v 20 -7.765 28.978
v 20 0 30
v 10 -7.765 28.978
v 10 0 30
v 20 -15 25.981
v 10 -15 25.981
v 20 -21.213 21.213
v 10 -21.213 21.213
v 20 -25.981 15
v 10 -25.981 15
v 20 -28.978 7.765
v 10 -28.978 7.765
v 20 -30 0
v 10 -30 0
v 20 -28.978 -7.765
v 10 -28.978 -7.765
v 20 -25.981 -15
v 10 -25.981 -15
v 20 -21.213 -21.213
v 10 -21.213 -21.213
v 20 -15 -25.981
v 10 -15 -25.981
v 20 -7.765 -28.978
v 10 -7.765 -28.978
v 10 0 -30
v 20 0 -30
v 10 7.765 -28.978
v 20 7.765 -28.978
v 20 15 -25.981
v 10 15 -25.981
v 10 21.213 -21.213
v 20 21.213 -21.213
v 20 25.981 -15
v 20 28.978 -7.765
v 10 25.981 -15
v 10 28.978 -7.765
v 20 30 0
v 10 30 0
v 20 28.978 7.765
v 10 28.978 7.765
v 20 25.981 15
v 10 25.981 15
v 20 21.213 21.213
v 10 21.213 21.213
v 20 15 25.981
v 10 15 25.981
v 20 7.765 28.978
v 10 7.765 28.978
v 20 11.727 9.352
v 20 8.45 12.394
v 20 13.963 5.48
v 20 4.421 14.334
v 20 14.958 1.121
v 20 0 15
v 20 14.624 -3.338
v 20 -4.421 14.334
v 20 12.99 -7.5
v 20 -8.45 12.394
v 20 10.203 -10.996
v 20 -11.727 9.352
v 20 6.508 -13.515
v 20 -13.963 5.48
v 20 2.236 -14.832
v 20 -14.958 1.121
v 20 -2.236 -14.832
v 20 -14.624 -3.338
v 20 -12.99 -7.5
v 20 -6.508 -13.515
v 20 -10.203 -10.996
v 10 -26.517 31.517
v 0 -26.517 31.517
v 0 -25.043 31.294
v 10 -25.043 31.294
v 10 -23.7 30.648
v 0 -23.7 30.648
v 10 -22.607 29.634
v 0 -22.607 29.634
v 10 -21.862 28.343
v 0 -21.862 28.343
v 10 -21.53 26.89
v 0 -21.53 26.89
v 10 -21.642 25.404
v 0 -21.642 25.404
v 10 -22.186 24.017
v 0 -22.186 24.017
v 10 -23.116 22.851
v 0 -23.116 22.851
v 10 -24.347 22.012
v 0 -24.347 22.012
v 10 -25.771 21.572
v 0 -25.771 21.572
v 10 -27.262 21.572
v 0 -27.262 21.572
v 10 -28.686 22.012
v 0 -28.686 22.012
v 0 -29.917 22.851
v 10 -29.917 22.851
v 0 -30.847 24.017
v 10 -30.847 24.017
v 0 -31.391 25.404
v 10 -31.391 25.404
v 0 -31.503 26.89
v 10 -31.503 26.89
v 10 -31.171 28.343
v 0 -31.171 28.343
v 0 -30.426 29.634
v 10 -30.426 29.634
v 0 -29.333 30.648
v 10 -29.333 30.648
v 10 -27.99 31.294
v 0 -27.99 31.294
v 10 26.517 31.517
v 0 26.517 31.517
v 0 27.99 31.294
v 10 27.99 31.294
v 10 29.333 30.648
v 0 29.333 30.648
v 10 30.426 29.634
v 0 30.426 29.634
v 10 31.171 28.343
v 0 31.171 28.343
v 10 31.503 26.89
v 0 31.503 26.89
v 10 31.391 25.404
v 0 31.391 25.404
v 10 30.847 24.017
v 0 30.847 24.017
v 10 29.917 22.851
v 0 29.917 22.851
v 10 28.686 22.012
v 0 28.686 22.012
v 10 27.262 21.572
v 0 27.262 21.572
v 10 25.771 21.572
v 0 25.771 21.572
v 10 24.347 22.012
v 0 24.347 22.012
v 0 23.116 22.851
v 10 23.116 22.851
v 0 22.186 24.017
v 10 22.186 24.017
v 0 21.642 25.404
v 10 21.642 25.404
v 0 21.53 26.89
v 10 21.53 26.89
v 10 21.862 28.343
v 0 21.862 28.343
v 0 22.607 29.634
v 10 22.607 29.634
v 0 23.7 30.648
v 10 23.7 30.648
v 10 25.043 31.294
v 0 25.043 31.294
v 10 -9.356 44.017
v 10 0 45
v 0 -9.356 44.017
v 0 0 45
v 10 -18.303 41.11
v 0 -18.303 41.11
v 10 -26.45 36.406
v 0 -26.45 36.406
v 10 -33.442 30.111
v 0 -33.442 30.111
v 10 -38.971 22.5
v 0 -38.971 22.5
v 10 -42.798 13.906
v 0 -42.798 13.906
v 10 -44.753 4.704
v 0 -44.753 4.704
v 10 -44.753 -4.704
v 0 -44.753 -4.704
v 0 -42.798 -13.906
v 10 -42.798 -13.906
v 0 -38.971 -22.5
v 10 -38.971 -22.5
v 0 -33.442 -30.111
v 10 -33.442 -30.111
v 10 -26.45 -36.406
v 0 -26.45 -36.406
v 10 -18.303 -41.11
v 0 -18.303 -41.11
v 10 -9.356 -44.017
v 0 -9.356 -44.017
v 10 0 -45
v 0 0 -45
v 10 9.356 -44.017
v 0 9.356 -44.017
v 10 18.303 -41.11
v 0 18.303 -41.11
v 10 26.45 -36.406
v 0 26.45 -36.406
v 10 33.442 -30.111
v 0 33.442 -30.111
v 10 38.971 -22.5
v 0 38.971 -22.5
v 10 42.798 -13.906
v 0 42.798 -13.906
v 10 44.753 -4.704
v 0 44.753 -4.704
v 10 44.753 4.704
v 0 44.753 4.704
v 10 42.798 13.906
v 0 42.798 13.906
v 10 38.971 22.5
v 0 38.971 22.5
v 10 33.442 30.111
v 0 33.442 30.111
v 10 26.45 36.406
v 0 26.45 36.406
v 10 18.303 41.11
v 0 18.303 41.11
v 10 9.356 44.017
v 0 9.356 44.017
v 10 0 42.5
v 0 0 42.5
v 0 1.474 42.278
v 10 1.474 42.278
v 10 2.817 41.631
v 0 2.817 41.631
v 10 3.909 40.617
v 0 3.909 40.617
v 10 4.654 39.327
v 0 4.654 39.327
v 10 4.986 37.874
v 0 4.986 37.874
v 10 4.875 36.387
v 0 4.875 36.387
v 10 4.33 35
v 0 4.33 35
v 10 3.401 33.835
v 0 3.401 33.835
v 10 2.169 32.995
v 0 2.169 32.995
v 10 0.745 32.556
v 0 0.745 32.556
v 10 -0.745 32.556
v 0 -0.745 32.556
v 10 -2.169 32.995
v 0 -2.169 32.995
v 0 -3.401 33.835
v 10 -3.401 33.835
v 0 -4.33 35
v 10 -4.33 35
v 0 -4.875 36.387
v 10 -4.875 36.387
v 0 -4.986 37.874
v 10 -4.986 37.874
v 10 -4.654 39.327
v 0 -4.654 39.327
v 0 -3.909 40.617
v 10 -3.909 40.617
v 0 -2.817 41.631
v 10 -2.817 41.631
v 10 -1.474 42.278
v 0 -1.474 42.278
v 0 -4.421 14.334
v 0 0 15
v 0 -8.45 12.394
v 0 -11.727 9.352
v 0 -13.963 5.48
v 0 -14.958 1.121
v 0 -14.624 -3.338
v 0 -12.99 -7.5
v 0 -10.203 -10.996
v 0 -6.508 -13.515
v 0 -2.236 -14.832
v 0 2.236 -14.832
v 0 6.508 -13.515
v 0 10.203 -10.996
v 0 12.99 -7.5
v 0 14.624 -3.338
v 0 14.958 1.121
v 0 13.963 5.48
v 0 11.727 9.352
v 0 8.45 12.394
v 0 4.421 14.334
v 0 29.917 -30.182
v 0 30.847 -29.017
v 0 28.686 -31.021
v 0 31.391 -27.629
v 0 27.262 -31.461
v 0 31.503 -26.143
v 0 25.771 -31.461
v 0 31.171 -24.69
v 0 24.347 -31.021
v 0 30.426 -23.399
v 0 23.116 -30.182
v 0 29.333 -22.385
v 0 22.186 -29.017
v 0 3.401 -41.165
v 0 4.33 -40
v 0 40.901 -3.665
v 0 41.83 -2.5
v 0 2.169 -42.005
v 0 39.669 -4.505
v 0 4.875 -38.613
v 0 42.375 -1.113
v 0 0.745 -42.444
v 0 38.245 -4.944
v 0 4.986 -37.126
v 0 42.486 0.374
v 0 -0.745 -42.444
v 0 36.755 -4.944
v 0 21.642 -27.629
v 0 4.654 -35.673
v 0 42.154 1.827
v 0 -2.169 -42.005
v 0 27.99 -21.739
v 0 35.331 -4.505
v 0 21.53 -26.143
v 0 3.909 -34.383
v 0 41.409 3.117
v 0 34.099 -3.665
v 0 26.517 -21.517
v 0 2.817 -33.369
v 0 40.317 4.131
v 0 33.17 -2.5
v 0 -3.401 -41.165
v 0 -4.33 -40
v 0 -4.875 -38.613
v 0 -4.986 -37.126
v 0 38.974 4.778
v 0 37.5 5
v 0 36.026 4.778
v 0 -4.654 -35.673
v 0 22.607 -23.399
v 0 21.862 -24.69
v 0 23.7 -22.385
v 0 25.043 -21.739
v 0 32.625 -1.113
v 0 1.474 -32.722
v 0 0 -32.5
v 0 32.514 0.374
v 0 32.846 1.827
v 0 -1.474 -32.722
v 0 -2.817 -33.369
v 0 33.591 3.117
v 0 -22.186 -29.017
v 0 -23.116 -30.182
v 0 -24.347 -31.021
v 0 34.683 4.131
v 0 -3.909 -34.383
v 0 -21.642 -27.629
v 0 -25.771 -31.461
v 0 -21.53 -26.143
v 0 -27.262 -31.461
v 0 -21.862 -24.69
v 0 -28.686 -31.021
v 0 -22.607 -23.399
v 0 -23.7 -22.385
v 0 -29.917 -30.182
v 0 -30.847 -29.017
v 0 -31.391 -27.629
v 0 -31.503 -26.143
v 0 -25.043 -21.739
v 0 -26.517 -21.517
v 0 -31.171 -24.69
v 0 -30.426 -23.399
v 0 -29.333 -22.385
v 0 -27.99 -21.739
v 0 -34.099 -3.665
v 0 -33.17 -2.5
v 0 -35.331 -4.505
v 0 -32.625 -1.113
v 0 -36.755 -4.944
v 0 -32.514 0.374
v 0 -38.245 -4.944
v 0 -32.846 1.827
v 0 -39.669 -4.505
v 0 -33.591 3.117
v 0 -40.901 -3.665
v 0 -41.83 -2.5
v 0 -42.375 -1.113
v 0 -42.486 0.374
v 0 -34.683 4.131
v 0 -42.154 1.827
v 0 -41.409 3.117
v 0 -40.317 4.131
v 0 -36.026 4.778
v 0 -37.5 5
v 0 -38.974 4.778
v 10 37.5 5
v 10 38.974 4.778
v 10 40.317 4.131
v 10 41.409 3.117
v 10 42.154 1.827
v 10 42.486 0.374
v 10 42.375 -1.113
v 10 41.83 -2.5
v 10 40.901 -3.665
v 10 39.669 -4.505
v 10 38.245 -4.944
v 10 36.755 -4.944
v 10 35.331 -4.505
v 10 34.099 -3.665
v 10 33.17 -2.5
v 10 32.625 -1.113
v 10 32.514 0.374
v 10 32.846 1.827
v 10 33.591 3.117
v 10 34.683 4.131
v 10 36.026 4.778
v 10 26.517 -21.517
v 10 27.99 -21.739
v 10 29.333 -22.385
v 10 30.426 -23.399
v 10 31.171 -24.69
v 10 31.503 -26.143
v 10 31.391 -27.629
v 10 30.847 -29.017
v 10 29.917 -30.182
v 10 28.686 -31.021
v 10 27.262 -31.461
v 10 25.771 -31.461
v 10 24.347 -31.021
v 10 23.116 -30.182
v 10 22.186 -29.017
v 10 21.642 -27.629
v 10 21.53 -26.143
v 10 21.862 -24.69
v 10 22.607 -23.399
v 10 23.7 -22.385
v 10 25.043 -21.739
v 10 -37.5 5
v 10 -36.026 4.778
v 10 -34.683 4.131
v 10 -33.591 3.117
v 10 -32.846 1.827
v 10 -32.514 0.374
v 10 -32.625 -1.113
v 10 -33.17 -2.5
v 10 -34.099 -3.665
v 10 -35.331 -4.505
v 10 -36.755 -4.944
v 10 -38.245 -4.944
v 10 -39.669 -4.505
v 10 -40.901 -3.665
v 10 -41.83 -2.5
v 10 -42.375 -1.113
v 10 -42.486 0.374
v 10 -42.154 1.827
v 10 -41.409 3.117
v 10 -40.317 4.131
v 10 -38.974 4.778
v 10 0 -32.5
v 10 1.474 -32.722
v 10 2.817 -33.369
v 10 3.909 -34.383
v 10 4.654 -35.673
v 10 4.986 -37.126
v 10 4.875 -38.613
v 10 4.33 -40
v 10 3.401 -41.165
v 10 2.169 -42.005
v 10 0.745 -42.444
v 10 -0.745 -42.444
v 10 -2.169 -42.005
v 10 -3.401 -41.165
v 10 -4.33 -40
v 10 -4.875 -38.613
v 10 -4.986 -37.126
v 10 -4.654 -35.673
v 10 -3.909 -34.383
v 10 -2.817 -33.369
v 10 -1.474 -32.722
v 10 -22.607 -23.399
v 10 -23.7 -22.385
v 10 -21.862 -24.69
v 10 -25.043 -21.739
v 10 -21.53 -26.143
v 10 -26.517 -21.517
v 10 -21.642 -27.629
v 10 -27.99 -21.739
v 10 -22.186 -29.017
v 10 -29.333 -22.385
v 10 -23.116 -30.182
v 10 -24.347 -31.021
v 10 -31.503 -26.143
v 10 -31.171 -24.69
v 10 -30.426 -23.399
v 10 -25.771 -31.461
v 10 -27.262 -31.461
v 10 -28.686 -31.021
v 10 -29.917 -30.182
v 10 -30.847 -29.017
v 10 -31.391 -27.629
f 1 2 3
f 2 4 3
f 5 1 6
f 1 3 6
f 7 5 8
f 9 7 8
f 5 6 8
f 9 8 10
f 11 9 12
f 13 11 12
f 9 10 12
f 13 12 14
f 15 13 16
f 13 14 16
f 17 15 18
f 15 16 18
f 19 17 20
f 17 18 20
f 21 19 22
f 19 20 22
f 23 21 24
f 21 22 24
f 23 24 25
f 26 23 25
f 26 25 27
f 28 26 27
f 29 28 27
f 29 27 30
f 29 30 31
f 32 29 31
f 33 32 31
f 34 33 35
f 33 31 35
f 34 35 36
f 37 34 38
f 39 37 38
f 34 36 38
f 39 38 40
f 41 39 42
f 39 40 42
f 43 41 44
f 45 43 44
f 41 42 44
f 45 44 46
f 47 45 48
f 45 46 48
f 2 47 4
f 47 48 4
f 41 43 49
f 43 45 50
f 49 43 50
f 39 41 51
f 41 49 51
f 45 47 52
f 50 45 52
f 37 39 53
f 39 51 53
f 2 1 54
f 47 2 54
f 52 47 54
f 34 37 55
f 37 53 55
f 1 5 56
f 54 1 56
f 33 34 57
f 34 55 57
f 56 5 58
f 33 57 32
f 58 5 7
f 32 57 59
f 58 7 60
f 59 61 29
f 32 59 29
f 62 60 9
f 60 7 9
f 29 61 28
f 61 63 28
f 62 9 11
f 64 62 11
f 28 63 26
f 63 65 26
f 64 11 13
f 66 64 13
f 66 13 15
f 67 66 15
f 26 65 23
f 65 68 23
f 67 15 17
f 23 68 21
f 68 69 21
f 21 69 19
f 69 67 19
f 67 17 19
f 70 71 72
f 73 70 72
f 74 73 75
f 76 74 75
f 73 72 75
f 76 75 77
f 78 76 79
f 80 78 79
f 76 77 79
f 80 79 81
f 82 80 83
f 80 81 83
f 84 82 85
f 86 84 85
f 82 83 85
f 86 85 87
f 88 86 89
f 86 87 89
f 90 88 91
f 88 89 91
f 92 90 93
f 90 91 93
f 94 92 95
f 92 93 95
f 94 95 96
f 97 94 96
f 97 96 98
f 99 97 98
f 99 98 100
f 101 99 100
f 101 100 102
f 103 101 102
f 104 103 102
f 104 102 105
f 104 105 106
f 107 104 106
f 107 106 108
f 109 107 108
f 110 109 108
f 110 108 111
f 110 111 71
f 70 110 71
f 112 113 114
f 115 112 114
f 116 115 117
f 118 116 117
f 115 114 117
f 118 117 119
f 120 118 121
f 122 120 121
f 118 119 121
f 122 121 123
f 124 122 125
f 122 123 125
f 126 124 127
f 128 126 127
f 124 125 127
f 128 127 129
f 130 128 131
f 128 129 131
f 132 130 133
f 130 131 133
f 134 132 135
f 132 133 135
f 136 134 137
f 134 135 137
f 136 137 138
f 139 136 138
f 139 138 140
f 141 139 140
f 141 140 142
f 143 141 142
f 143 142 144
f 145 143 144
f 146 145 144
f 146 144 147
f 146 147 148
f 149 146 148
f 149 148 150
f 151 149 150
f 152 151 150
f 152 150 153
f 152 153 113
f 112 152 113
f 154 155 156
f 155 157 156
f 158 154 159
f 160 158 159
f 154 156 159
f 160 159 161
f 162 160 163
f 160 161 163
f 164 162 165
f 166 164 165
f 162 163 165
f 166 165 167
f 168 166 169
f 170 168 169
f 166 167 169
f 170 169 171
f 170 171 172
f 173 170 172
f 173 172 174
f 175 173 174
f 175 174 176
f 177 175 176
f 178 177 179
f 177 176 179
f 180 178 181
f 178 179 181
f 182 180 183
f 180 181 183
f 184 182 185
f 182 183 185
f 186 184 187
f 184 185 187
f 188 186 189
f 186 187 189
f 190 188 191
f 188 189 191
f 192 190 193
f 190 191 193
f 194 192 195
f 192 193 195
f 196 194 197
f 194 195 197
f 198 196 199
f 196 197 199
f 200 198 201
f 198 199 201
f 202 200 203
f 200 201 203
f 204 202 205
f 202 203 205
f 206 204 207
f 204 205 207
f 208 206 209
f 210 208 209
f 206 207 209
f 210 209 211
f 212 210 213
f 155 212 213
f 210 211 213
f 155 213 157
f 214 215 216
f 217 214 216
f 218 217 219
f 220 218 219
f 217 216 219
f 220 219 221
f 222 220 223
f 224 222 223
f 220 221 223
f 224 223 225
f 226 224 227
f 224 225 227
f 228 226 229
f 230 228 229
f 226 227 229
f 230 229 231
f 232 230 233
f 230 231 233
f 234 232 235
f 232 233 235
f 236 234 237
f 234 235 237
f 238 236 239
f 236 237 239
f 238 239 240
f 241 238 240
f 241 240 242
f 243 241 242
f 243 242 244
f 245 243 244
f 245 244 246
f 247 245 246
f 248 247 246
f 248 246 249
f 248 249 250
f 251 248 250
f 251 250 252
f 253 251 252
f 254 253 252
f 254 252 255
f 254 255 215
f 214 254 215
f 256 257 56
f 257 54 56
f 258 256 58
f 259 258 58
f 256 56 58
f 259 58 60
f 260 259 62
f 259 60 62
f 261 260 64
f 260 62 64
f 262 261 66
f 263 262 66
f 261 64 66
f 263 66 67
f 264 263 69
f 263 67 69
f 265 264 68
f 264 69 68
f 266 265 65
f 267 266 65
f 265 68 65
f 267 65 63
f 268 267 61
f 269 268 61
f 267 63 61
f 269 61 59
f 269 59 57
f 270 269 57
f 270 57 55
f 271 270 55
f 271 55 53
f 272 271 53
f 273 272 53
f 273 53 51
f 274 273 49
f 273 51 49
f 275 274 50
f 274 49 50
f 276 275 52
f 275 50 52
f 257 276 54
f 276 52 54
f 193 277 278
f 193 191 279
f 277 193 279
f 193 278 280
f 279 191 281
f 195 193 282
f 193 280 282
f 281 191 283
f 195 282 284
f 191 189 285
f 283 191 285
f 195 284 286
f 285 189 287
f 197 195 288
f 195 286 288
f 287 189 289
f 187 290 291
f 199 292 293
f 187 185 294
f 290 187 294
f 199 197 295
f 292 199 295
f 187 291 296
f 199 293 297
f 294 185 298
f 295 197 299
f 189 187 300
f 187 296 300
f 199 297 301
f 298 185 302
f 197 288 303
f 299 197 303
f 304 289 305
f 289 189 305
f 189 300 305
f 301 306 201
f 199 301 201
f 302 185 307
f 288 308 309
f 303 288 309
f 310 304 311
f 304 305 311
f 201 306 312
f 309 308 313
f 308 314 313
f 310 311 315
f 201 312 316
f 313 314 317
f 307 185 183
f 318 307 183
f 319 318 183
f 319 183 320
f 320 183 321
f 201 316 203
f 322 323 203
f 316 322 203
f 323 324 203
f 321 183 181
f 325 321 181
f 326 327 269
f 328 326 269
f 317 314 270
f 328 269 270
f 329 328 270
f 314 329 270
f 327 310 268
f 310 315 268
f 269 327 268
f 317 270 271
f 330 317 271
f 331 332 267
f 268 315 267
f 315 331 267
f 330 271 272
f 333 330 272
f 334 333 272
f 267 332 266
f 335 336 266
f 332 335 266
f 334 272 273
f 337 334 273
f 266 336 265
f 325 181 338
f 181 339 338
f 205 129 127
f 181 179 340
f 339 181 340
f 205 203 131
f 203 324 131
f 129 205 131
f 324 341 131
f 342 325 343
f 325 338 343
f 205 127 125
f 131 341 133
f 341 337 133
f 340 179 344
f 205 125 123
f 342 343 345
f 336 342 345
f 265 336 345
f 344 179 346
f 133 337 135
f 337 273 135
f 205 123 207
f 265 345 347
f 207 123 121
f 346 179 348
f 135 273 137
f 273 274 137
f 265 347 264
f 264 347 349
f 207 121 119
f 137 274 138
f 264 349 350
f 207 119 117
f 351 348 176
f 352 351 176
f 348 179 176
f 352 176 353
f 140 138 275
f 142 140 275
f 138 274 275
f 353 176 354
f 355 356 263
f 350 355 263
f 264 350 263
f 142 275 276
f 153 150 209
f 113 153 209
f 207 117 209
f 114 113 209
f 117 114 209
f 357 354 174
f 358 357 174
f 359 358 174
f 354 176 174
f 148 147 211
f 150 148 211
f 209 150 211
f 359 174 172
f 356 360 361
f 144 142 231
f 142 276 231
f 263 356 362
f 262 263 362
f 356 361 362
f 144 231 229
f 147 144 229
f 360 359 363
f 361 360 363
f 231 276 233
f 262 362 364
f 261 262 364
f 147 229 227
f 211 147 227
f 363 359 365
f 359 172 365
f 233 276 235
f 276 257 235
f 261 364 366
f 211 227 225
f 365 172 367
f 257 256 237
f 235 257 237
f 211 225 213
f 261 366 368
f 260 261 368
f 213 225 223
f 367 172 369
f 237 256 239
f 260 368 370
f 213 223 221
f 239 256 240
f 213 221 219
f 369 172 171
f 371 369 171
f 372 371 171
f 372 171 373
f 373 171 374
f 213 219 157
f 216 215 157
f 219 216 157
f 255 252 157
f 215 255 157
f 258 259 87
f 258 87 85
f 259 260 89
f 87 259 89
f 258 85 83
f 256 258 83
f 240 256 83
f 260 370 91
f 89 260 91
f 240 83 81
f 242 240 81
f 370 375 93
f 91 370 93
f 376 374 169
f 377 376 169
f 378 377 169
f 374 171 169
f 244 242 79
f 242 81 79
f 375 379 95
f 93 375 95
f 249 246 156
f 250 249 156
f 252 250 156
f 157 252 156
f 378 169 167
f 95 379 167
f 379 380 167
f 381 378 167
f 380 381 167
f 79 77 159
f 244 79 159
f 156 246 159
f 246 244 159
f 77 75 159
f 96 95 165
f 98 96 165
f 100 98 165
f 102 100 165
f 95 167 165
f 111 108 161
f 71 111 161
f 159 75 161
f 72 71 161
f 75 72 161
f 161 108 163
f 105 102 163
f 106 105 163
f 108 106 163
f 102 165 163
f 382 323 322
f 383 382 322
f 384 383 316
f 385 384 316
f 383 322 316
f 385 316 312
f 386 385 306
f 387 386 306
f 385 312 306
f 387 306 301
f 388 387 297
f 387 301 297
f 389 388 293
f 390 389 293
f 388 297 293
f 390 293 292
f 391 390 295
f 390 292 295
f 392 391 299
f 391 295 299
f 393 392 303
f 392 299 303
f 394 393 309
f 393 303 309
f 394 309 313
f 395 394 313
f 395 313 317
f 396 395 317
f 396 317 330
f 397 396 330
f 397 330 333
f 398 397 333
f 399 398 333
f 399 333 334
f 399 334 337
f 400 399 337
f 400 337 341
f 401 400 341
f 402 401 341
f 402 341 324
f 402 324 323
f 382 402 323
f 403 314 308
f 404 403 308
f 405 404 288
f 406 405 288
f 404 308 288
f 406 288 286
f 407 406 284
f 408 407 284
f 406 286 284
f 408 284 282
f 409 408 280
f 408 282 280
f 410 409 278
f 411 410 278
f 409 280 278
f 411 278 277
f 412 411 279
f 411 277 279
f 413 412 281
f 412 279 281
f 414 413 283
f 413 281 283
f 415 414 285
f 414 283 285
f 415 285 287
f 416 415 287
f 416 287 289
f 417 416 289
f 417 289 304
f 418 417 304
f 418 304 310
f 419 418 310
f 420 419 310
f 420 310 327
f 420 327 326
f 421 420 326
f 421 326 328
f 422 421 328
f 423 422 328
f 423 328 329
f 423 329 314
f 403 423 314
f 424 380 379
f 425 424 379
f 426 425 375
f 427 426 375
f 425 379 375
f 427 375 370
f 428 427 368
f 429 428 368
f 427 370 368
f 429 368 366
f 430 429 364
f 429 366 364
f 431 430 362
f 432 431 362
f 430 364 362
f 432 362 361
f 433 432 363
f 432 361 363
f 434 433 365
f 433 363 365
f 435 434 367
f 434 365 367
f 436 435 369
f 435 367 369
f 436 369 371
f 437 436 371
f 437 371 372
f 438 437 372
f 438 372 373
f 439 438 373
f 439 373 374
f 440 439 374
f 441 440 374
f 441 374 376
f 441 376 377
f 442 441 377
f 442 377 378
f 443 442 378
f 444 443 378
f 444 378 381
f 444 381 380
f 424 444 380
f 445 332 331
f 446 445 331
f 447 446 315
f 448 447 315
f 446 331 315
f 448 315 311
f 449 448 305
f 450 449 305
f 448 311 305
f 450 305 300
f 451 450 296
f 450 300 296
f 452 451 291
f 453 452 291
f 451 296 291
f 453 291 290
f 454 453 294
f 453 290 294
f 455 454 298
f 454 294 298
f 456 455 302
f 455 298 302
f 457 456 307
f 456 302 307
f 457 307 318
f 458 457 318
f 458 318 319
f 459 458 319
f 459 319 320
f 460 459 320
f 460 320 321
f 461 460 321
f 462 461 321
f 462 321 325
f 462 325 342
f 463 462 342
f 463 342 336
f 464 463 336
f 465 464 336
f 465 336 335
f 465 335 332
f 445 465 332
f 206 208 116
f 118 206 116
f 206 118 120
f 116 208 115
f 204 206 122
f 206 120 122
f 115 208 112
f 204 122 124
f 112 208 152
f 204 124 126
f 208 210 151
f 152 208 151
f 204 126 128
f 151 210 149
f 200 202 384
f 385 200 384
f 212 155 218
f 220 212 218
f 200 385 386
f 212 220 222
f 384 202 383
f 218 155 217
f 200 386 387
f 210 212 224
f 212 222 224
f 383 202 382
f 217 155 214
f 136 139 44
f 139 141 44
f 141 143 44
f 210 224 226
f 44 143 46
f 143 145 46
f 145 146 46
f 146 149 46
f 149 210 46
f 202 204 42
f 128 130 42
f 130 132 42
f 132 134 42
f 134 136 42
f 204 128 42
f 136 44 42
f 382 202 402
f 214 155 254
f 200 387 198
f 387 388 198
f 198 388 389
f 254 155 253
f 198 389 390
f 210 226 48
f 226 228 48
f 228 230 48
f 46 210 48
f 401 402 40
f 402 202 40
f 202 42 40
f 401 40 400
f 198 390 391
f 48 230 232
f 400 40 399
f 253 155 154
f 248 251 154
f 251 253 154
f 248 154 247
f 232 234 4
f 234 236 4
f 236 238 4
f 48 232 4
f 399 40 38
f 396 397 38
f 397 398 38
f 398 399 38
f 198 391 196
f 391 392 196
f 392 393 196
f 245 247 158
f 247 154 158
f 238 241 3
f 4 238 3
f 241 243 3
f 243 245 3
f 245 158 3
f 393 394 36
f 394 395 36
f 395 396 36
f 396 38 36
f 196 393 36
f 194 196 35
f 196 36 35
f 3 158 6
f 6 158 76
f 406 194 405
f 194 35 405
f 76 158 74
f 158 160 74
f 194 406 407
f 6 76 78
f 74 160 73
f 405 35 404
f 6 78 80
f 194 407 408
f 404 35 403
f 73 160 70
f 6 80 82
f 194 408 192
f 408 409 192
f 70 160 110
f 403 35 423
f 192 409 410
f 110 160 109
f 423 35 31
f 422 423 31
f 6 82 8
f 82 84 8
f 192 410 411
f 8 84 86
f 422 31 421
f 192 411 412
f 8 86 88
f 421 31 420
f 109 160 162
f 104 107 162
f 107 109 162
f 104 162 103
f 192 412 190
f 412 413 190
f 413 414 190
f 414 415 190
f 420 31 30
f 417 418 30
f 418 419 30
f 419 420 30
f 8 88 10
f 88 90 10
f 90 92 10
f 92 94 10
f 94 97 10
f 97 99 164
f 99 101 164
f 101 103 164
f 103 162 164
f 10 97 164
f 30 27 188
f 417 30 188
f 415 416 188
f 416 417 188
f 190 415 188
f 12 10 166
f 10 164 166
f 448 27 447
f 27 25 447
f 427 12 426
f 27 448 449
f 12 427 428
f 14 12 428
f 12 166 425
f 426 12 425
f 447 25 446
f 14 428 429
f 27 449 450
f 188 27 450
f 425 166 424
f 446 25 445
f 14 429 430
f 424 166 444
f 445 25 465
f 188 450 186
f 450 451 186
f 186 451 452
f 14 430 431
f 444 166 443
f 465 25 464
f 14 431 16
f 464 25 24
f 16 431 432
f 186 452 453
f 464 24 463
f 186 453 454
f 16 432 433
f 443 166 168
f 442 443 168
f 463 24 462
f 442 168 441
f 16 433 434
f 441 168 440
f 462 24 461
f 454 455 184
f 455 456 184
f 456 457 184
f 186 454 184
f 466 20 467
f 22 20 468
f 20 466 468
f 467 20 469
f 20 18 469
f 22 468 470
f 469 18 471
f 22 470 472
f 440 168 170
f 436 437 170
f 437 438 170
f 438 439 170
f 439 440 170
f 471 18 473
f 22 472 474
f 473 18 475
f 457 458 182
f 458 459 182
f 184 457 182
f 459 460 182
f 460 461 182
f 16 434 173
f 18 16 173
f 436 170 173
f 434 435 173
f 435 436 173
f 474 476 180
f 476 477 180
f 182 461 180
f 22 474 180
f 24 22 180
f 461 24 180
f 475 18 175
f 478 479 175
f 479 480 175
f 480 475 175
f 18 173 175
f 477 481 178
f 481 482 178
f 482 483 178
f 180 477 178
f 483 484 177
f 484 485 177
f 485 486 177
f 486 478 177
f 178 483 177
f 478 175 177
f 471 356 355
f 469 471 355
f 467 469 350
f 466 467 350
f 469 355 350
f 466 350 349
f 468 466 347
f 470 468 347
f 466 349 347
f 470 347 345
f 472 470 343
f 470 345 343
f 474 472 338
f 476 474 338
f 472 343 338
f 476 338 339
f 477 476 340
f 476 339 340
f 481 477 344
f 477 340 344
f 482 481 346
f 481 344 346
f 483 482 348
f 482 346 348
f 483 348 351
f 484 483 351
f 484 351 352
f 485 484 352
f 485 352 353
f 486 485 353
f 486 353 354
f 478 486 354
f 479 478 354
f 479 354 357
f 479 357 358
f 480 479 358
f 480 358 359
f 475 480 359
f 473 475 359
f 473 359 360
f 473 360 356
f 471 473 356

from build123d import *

# Parameters (mm, degrees)
SKETCH3_R          = 5
CUT_EXTRUDE1_DEPTH = 67.708320321


with BuildPart() as part:
    # Sketch2 → Revolve1 (revolve)
    with BuildSketch(Plane.XY, mode=Mode.PRIVATE) as revolve1_sk:
        Polygon((0, 15), (20, 15), (20, 30), (10, 30), (10, 45), (0, 45), align=None)
    revolve(revolve1_sk.sketch.rotate(Axis((0, 0, 0), (1, 0, 0)), 90), axis=Axis((0, 0, 0), (1, 0, 0)))

    # Sketch3 → Cut-Extrude1 (cut, through all)
    with BuildSketch(Plane.ZY):
        with Locations((0, 37.5)):
            Circle(SKETCH3_R)
        with Locations((26.516504294, 26.516504294)):
            Circle(SKETCH3_R)
        with Locations((37.5, 0)):
            Circle(SKETCH3_R)
        with Locations((26.516504294, -26.516504294)):
            Circle(SKETCH3_R)
        with Locations((0, -37.5)):
            Circle(SKETCH3_R)
        with Locations((-26.516504294, -26.516504294)):
            Circle(SKETCH3_R)
        with Locations((-37.5, 0)):
            Circle(SKETCH3_R)
        with Locations((-26.516504294, 26.516504294)):
            Circle(SKETCH3_R)
    extrude(amount=-CUT_EXTRUDE1_DEPTH, mode=Mode.SUBTRACT)


solid = part.part
